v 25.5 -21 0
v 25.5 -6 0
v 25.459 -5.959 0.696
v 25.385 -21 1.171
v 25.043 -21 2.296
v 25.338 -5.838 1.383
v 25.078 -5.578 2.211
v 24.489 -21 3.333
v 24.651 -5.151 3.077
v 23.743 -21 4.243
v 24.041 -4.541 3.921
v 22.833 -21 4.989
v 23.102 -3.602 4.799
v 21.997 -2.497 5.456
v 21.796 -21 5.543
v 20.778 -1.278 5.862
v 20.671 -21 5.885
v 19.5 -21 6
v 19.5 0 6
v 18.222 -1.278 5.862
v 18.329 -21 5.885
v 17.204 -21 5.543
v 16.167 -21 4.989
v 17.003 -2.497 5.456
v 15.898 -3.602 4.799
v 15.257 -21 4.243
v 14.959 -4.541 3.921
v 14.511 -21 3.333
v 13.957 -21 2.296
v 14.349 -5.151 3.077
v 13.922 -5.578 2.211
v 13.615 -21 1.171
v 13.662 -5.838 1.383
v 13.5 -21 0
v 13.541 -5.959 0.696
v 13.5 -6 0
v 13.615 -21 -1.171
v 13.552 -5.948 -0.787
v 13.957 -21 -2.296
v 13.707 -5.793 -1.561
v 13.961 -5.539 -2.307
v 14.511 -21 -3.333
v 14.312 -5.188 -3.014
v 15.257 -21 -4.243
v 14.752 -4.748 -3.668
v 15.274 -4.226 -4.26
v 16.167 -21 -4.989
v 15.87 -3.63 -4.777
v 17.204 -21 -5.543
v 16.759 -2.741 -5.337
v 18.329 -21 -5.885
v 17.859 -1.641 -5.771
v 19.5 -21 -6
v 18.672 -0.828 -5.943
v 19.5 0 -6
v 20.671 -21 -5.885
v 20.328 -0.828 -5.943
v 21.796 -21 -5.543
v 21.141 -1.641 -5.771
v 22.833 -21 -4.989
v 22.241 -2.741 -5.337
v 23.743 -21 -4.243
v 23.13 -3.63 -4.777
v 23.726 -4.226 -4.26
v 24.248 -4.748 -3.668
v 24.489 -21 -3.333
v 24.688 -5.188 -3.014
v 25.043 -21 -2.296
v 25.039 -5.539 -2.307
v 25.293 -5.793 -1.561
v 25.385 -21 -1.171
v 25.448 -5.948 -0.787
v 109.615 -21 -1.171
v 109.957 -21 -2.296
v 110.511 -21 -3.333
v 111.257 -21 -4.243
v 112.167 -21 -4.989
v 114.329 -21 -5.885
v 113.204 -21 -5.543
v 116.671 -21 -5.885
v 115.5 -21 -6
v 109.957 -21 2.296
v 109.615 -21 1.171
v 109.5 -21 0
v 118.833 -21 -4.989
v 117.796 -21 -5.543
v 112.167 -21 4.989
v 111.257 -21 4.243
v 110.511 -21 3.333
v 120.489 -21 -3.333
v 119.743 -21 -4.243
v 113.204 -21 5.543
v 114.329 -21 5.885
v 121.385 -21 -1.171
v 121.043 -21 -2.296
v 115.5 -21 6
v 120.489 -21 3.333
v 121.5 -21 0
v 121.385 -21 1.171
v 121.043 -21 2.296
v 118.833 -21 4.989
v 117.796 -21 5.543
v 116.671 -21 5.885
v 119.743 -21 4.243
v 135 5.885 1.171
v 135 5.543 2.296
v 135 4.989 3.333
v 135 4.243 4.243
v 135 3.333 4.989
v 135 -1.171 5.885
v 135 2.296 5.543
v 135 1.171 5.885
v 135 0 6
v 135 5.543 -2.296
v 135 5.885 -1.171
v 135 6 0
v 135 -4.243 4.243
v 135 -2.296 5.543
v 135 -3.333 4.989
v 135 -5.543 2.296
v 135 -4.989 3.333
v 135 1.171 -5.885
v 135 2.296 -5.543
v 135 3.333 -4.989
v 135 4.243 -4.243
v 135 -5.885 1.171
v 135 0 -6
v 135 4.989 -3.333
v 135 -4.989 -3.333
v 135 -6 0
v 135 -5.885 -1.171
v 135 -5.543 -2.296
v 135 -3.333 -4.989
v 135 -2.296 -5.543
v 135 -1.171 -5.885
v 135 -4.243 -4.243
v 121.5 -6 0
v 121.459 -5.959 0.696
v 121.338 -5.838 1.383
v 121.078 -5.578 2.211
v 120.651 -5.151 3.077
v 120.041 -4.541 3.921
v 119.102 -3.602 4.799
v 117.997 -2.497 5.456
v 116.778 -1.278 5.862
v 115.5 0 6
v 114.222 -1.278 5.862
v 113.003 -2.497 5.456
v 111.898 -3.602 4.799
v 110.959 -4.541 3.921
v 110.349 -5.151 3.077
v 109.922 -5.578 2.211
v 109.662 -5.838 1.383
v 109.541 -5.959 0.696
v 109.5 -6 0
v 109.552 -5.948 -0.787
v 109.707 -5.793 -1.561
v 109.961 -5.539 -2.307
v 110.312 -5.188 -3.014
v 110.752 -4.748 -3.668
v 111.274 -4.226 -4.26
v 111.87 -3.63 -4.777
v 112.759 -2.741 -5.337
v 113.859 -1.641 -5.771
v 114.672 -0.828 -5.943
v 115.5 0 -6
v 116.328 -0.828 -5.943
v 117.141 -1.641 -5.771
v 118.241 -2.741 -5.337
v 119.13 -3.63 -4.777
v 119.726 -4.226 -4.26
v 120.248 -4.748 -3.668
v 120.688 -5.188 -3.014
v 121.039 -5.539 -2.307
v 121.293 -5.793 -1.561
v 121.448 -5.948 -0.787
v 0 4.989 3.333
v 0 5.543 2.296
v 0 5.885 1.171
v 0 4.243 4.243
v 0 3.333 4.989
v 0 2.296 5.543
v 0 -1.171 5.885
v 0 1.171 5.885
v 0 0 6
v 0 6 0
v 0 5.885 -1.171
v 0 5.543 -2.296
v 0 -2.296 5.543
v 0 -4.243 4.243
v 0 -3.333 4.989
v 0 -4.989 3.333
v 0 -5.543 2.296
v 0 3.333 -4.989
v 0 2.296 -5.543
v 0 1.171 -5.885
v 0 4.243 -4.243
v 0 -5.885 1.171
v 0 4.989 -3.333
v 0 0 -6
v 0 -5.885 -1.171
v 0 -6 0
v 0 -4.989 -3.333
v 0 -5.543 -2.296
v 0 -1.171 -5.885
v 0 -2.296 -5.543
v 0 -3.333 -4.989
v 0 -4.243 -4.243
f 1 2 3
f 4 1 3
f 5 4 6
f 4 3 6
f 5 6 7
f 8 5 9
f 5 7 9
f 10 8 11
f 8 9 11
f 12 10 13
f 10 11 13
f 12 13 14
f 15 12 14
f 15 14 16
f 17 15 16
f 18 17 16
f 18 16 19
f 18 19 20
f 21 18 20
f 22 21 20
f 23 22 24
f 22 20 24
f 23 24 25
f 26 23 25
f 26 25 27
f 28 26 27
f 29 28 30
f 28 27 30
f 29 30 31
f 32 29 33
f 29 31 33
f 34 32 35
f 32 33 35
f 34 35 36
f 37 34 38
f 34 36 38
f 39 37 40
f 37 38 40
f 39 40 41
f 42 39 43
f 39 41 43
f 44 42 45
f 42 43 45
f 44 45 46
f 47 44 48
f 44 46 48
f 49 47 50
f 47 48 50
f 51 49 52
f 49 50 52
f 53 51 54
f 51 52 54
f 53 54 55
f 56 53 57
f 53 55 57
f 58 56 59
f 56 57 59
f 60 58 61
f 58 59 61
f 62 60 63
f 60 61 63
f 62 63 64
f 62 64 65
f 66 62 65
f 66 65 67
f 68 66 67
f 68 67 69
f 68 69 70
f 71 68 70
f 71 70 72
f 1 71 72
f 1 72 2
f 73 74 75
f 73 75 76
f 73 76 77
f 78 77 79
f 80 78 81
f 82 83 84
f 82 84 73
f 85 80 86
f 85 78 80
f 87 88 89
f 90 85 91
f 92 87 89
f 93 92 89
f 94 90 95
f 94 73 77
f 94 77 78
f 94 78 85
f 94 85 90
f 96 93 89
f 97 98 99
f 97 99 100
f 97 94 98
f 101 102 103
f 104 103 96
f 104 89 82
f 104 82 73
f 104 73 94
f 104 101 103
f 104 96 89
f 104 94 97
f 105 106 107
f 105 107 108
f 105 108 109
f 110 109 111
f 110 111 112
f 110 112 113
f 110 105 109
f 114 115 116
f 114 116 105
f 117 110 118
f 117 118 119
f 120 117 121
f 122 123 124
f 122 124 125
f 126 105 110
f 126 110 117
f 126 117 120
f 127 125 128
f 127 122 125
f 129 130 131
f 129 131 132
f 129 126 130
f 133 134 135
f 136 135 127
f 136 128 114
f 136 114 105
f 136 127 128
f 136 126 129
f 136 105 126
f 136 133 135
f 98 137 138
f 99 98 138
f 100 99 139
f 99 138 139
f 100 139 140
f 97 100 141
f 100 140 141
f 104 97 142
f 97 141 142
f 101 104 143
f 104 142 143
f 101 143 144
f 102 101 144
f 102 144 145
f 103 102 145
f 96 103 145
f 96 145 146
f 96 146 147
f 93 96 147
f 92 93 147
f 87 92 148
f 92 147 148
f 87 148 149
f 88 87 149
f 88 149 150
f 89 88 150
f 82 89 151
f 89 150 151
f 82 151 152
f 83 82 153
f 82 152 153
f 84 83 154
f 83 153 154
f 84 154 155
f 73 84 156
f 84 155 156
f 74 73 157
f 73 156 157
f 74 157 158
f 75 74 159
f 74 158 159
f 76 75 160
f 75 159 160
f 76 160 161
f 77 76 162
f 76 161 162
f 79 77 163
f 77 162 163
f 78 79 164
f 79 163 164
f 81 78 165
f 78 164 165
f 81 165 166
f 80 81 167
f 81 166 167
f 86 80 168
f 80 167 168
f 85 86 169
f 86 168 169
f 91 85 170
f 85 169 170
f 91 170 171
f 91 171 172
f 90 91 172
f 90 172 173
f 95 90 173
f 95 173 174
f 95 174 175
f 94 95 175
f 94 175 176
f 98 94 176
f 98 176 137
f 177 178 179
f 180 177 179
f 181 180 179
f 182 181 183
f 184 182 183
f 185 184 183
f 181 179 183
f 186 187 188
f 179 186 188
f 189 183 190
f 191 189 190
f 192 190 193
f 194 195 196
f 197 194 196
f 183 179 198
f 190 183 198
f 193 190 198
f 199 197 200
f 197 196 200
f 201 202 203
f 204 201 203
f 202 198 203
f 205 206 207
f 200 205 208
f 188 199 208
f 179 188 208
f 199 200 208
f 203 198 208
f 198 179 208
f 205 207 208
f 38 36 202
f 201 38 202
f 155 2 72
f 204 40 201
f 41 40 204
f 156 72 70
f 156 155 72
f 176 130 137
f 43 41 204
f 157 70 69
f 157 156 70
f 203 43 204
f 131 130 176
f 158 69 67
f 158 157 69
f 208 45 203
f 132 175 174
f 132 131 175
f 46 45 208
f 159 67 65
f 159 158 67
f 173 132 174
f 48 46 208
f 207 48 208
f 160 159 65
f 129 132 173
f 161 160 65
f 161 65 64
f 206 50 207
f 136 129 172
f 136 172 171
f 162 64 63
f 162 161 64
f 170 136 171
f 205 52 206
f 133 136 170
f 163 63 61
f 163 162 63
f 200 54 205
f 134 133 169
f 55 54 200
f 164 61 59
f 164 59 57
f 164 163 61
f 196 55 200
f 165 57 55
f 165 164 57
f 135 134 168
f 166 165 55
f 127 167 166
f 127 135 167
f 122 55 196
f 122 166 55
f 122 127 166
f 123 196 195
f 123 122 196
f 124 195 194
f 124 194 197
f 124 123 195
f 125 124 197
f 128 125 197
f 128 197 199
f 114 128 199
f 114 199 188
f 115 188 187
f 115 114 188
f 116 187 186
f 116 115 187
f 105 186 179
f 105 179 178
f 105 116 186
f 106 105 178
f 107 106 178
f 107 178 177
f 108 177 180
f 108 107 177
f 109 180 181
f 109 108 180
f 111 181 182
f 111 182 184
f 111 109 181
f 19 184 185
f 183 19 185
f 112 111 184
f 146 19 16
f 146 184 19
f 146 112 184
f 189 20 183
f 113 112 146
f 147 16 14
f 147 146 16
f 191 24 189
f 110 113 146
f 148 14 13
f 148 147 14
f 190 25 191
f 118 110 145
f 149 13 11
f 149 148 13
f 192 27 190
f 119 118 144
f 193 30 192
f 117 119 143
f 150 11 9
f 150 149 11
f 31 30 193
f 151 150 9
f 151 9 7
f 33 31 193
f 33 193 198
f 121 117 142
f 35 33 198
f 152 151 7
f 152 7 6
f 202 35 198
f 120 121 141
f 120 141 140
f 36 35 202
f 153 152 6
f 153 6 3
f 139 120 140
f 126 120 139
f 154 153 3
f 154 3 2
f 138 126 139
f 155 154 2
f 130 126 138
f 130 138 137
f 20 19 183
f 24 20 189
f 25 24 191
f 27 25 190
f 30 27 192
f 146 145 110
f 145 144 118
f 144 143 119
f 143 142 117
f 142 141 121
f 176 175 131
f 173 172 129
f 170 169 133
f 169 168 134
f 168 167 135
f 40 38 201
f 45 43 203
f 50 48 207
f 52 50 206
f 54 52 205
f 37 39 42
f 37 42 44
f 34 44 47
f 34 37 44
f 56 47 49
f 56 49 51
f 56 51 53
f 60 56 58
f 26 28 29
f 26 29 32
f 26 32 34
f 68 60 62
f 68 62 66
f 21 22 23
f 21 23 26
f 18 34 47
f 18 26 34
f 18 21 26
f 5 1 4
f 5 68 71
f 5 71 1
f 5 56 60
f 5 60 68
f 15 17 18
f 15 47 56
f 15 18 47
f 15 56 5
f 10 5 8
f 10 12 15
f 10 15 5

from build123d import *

# Parameters (mm, degrees)
SKETCH_W    = 135
SKETCH_H    = 6
SKETCH001_R = 6
PAD_DEPTH   = 21


with BuildPart() as part:
    # Sketch → Revolution (revolve)
    with BuildSketch(Plane.XY):
        with Locations((67.5, -3)):
            Rectangle(SKETCH_W, SKETCH_H)
    revolve(axis=Axis((0, 0, 0), (1, 0, 0)))

    # Sketch001 → Pad (new body)
    with BuildSketch(Plane.XZ):
        with Locations((19.5, 0)):
            Circle(SKETCH001_R)
        with Locations((115.5, 0)):
            Circle(SKETCH001_R)
    extrude(amount=PAD_DEPTH)


solid = part.part
